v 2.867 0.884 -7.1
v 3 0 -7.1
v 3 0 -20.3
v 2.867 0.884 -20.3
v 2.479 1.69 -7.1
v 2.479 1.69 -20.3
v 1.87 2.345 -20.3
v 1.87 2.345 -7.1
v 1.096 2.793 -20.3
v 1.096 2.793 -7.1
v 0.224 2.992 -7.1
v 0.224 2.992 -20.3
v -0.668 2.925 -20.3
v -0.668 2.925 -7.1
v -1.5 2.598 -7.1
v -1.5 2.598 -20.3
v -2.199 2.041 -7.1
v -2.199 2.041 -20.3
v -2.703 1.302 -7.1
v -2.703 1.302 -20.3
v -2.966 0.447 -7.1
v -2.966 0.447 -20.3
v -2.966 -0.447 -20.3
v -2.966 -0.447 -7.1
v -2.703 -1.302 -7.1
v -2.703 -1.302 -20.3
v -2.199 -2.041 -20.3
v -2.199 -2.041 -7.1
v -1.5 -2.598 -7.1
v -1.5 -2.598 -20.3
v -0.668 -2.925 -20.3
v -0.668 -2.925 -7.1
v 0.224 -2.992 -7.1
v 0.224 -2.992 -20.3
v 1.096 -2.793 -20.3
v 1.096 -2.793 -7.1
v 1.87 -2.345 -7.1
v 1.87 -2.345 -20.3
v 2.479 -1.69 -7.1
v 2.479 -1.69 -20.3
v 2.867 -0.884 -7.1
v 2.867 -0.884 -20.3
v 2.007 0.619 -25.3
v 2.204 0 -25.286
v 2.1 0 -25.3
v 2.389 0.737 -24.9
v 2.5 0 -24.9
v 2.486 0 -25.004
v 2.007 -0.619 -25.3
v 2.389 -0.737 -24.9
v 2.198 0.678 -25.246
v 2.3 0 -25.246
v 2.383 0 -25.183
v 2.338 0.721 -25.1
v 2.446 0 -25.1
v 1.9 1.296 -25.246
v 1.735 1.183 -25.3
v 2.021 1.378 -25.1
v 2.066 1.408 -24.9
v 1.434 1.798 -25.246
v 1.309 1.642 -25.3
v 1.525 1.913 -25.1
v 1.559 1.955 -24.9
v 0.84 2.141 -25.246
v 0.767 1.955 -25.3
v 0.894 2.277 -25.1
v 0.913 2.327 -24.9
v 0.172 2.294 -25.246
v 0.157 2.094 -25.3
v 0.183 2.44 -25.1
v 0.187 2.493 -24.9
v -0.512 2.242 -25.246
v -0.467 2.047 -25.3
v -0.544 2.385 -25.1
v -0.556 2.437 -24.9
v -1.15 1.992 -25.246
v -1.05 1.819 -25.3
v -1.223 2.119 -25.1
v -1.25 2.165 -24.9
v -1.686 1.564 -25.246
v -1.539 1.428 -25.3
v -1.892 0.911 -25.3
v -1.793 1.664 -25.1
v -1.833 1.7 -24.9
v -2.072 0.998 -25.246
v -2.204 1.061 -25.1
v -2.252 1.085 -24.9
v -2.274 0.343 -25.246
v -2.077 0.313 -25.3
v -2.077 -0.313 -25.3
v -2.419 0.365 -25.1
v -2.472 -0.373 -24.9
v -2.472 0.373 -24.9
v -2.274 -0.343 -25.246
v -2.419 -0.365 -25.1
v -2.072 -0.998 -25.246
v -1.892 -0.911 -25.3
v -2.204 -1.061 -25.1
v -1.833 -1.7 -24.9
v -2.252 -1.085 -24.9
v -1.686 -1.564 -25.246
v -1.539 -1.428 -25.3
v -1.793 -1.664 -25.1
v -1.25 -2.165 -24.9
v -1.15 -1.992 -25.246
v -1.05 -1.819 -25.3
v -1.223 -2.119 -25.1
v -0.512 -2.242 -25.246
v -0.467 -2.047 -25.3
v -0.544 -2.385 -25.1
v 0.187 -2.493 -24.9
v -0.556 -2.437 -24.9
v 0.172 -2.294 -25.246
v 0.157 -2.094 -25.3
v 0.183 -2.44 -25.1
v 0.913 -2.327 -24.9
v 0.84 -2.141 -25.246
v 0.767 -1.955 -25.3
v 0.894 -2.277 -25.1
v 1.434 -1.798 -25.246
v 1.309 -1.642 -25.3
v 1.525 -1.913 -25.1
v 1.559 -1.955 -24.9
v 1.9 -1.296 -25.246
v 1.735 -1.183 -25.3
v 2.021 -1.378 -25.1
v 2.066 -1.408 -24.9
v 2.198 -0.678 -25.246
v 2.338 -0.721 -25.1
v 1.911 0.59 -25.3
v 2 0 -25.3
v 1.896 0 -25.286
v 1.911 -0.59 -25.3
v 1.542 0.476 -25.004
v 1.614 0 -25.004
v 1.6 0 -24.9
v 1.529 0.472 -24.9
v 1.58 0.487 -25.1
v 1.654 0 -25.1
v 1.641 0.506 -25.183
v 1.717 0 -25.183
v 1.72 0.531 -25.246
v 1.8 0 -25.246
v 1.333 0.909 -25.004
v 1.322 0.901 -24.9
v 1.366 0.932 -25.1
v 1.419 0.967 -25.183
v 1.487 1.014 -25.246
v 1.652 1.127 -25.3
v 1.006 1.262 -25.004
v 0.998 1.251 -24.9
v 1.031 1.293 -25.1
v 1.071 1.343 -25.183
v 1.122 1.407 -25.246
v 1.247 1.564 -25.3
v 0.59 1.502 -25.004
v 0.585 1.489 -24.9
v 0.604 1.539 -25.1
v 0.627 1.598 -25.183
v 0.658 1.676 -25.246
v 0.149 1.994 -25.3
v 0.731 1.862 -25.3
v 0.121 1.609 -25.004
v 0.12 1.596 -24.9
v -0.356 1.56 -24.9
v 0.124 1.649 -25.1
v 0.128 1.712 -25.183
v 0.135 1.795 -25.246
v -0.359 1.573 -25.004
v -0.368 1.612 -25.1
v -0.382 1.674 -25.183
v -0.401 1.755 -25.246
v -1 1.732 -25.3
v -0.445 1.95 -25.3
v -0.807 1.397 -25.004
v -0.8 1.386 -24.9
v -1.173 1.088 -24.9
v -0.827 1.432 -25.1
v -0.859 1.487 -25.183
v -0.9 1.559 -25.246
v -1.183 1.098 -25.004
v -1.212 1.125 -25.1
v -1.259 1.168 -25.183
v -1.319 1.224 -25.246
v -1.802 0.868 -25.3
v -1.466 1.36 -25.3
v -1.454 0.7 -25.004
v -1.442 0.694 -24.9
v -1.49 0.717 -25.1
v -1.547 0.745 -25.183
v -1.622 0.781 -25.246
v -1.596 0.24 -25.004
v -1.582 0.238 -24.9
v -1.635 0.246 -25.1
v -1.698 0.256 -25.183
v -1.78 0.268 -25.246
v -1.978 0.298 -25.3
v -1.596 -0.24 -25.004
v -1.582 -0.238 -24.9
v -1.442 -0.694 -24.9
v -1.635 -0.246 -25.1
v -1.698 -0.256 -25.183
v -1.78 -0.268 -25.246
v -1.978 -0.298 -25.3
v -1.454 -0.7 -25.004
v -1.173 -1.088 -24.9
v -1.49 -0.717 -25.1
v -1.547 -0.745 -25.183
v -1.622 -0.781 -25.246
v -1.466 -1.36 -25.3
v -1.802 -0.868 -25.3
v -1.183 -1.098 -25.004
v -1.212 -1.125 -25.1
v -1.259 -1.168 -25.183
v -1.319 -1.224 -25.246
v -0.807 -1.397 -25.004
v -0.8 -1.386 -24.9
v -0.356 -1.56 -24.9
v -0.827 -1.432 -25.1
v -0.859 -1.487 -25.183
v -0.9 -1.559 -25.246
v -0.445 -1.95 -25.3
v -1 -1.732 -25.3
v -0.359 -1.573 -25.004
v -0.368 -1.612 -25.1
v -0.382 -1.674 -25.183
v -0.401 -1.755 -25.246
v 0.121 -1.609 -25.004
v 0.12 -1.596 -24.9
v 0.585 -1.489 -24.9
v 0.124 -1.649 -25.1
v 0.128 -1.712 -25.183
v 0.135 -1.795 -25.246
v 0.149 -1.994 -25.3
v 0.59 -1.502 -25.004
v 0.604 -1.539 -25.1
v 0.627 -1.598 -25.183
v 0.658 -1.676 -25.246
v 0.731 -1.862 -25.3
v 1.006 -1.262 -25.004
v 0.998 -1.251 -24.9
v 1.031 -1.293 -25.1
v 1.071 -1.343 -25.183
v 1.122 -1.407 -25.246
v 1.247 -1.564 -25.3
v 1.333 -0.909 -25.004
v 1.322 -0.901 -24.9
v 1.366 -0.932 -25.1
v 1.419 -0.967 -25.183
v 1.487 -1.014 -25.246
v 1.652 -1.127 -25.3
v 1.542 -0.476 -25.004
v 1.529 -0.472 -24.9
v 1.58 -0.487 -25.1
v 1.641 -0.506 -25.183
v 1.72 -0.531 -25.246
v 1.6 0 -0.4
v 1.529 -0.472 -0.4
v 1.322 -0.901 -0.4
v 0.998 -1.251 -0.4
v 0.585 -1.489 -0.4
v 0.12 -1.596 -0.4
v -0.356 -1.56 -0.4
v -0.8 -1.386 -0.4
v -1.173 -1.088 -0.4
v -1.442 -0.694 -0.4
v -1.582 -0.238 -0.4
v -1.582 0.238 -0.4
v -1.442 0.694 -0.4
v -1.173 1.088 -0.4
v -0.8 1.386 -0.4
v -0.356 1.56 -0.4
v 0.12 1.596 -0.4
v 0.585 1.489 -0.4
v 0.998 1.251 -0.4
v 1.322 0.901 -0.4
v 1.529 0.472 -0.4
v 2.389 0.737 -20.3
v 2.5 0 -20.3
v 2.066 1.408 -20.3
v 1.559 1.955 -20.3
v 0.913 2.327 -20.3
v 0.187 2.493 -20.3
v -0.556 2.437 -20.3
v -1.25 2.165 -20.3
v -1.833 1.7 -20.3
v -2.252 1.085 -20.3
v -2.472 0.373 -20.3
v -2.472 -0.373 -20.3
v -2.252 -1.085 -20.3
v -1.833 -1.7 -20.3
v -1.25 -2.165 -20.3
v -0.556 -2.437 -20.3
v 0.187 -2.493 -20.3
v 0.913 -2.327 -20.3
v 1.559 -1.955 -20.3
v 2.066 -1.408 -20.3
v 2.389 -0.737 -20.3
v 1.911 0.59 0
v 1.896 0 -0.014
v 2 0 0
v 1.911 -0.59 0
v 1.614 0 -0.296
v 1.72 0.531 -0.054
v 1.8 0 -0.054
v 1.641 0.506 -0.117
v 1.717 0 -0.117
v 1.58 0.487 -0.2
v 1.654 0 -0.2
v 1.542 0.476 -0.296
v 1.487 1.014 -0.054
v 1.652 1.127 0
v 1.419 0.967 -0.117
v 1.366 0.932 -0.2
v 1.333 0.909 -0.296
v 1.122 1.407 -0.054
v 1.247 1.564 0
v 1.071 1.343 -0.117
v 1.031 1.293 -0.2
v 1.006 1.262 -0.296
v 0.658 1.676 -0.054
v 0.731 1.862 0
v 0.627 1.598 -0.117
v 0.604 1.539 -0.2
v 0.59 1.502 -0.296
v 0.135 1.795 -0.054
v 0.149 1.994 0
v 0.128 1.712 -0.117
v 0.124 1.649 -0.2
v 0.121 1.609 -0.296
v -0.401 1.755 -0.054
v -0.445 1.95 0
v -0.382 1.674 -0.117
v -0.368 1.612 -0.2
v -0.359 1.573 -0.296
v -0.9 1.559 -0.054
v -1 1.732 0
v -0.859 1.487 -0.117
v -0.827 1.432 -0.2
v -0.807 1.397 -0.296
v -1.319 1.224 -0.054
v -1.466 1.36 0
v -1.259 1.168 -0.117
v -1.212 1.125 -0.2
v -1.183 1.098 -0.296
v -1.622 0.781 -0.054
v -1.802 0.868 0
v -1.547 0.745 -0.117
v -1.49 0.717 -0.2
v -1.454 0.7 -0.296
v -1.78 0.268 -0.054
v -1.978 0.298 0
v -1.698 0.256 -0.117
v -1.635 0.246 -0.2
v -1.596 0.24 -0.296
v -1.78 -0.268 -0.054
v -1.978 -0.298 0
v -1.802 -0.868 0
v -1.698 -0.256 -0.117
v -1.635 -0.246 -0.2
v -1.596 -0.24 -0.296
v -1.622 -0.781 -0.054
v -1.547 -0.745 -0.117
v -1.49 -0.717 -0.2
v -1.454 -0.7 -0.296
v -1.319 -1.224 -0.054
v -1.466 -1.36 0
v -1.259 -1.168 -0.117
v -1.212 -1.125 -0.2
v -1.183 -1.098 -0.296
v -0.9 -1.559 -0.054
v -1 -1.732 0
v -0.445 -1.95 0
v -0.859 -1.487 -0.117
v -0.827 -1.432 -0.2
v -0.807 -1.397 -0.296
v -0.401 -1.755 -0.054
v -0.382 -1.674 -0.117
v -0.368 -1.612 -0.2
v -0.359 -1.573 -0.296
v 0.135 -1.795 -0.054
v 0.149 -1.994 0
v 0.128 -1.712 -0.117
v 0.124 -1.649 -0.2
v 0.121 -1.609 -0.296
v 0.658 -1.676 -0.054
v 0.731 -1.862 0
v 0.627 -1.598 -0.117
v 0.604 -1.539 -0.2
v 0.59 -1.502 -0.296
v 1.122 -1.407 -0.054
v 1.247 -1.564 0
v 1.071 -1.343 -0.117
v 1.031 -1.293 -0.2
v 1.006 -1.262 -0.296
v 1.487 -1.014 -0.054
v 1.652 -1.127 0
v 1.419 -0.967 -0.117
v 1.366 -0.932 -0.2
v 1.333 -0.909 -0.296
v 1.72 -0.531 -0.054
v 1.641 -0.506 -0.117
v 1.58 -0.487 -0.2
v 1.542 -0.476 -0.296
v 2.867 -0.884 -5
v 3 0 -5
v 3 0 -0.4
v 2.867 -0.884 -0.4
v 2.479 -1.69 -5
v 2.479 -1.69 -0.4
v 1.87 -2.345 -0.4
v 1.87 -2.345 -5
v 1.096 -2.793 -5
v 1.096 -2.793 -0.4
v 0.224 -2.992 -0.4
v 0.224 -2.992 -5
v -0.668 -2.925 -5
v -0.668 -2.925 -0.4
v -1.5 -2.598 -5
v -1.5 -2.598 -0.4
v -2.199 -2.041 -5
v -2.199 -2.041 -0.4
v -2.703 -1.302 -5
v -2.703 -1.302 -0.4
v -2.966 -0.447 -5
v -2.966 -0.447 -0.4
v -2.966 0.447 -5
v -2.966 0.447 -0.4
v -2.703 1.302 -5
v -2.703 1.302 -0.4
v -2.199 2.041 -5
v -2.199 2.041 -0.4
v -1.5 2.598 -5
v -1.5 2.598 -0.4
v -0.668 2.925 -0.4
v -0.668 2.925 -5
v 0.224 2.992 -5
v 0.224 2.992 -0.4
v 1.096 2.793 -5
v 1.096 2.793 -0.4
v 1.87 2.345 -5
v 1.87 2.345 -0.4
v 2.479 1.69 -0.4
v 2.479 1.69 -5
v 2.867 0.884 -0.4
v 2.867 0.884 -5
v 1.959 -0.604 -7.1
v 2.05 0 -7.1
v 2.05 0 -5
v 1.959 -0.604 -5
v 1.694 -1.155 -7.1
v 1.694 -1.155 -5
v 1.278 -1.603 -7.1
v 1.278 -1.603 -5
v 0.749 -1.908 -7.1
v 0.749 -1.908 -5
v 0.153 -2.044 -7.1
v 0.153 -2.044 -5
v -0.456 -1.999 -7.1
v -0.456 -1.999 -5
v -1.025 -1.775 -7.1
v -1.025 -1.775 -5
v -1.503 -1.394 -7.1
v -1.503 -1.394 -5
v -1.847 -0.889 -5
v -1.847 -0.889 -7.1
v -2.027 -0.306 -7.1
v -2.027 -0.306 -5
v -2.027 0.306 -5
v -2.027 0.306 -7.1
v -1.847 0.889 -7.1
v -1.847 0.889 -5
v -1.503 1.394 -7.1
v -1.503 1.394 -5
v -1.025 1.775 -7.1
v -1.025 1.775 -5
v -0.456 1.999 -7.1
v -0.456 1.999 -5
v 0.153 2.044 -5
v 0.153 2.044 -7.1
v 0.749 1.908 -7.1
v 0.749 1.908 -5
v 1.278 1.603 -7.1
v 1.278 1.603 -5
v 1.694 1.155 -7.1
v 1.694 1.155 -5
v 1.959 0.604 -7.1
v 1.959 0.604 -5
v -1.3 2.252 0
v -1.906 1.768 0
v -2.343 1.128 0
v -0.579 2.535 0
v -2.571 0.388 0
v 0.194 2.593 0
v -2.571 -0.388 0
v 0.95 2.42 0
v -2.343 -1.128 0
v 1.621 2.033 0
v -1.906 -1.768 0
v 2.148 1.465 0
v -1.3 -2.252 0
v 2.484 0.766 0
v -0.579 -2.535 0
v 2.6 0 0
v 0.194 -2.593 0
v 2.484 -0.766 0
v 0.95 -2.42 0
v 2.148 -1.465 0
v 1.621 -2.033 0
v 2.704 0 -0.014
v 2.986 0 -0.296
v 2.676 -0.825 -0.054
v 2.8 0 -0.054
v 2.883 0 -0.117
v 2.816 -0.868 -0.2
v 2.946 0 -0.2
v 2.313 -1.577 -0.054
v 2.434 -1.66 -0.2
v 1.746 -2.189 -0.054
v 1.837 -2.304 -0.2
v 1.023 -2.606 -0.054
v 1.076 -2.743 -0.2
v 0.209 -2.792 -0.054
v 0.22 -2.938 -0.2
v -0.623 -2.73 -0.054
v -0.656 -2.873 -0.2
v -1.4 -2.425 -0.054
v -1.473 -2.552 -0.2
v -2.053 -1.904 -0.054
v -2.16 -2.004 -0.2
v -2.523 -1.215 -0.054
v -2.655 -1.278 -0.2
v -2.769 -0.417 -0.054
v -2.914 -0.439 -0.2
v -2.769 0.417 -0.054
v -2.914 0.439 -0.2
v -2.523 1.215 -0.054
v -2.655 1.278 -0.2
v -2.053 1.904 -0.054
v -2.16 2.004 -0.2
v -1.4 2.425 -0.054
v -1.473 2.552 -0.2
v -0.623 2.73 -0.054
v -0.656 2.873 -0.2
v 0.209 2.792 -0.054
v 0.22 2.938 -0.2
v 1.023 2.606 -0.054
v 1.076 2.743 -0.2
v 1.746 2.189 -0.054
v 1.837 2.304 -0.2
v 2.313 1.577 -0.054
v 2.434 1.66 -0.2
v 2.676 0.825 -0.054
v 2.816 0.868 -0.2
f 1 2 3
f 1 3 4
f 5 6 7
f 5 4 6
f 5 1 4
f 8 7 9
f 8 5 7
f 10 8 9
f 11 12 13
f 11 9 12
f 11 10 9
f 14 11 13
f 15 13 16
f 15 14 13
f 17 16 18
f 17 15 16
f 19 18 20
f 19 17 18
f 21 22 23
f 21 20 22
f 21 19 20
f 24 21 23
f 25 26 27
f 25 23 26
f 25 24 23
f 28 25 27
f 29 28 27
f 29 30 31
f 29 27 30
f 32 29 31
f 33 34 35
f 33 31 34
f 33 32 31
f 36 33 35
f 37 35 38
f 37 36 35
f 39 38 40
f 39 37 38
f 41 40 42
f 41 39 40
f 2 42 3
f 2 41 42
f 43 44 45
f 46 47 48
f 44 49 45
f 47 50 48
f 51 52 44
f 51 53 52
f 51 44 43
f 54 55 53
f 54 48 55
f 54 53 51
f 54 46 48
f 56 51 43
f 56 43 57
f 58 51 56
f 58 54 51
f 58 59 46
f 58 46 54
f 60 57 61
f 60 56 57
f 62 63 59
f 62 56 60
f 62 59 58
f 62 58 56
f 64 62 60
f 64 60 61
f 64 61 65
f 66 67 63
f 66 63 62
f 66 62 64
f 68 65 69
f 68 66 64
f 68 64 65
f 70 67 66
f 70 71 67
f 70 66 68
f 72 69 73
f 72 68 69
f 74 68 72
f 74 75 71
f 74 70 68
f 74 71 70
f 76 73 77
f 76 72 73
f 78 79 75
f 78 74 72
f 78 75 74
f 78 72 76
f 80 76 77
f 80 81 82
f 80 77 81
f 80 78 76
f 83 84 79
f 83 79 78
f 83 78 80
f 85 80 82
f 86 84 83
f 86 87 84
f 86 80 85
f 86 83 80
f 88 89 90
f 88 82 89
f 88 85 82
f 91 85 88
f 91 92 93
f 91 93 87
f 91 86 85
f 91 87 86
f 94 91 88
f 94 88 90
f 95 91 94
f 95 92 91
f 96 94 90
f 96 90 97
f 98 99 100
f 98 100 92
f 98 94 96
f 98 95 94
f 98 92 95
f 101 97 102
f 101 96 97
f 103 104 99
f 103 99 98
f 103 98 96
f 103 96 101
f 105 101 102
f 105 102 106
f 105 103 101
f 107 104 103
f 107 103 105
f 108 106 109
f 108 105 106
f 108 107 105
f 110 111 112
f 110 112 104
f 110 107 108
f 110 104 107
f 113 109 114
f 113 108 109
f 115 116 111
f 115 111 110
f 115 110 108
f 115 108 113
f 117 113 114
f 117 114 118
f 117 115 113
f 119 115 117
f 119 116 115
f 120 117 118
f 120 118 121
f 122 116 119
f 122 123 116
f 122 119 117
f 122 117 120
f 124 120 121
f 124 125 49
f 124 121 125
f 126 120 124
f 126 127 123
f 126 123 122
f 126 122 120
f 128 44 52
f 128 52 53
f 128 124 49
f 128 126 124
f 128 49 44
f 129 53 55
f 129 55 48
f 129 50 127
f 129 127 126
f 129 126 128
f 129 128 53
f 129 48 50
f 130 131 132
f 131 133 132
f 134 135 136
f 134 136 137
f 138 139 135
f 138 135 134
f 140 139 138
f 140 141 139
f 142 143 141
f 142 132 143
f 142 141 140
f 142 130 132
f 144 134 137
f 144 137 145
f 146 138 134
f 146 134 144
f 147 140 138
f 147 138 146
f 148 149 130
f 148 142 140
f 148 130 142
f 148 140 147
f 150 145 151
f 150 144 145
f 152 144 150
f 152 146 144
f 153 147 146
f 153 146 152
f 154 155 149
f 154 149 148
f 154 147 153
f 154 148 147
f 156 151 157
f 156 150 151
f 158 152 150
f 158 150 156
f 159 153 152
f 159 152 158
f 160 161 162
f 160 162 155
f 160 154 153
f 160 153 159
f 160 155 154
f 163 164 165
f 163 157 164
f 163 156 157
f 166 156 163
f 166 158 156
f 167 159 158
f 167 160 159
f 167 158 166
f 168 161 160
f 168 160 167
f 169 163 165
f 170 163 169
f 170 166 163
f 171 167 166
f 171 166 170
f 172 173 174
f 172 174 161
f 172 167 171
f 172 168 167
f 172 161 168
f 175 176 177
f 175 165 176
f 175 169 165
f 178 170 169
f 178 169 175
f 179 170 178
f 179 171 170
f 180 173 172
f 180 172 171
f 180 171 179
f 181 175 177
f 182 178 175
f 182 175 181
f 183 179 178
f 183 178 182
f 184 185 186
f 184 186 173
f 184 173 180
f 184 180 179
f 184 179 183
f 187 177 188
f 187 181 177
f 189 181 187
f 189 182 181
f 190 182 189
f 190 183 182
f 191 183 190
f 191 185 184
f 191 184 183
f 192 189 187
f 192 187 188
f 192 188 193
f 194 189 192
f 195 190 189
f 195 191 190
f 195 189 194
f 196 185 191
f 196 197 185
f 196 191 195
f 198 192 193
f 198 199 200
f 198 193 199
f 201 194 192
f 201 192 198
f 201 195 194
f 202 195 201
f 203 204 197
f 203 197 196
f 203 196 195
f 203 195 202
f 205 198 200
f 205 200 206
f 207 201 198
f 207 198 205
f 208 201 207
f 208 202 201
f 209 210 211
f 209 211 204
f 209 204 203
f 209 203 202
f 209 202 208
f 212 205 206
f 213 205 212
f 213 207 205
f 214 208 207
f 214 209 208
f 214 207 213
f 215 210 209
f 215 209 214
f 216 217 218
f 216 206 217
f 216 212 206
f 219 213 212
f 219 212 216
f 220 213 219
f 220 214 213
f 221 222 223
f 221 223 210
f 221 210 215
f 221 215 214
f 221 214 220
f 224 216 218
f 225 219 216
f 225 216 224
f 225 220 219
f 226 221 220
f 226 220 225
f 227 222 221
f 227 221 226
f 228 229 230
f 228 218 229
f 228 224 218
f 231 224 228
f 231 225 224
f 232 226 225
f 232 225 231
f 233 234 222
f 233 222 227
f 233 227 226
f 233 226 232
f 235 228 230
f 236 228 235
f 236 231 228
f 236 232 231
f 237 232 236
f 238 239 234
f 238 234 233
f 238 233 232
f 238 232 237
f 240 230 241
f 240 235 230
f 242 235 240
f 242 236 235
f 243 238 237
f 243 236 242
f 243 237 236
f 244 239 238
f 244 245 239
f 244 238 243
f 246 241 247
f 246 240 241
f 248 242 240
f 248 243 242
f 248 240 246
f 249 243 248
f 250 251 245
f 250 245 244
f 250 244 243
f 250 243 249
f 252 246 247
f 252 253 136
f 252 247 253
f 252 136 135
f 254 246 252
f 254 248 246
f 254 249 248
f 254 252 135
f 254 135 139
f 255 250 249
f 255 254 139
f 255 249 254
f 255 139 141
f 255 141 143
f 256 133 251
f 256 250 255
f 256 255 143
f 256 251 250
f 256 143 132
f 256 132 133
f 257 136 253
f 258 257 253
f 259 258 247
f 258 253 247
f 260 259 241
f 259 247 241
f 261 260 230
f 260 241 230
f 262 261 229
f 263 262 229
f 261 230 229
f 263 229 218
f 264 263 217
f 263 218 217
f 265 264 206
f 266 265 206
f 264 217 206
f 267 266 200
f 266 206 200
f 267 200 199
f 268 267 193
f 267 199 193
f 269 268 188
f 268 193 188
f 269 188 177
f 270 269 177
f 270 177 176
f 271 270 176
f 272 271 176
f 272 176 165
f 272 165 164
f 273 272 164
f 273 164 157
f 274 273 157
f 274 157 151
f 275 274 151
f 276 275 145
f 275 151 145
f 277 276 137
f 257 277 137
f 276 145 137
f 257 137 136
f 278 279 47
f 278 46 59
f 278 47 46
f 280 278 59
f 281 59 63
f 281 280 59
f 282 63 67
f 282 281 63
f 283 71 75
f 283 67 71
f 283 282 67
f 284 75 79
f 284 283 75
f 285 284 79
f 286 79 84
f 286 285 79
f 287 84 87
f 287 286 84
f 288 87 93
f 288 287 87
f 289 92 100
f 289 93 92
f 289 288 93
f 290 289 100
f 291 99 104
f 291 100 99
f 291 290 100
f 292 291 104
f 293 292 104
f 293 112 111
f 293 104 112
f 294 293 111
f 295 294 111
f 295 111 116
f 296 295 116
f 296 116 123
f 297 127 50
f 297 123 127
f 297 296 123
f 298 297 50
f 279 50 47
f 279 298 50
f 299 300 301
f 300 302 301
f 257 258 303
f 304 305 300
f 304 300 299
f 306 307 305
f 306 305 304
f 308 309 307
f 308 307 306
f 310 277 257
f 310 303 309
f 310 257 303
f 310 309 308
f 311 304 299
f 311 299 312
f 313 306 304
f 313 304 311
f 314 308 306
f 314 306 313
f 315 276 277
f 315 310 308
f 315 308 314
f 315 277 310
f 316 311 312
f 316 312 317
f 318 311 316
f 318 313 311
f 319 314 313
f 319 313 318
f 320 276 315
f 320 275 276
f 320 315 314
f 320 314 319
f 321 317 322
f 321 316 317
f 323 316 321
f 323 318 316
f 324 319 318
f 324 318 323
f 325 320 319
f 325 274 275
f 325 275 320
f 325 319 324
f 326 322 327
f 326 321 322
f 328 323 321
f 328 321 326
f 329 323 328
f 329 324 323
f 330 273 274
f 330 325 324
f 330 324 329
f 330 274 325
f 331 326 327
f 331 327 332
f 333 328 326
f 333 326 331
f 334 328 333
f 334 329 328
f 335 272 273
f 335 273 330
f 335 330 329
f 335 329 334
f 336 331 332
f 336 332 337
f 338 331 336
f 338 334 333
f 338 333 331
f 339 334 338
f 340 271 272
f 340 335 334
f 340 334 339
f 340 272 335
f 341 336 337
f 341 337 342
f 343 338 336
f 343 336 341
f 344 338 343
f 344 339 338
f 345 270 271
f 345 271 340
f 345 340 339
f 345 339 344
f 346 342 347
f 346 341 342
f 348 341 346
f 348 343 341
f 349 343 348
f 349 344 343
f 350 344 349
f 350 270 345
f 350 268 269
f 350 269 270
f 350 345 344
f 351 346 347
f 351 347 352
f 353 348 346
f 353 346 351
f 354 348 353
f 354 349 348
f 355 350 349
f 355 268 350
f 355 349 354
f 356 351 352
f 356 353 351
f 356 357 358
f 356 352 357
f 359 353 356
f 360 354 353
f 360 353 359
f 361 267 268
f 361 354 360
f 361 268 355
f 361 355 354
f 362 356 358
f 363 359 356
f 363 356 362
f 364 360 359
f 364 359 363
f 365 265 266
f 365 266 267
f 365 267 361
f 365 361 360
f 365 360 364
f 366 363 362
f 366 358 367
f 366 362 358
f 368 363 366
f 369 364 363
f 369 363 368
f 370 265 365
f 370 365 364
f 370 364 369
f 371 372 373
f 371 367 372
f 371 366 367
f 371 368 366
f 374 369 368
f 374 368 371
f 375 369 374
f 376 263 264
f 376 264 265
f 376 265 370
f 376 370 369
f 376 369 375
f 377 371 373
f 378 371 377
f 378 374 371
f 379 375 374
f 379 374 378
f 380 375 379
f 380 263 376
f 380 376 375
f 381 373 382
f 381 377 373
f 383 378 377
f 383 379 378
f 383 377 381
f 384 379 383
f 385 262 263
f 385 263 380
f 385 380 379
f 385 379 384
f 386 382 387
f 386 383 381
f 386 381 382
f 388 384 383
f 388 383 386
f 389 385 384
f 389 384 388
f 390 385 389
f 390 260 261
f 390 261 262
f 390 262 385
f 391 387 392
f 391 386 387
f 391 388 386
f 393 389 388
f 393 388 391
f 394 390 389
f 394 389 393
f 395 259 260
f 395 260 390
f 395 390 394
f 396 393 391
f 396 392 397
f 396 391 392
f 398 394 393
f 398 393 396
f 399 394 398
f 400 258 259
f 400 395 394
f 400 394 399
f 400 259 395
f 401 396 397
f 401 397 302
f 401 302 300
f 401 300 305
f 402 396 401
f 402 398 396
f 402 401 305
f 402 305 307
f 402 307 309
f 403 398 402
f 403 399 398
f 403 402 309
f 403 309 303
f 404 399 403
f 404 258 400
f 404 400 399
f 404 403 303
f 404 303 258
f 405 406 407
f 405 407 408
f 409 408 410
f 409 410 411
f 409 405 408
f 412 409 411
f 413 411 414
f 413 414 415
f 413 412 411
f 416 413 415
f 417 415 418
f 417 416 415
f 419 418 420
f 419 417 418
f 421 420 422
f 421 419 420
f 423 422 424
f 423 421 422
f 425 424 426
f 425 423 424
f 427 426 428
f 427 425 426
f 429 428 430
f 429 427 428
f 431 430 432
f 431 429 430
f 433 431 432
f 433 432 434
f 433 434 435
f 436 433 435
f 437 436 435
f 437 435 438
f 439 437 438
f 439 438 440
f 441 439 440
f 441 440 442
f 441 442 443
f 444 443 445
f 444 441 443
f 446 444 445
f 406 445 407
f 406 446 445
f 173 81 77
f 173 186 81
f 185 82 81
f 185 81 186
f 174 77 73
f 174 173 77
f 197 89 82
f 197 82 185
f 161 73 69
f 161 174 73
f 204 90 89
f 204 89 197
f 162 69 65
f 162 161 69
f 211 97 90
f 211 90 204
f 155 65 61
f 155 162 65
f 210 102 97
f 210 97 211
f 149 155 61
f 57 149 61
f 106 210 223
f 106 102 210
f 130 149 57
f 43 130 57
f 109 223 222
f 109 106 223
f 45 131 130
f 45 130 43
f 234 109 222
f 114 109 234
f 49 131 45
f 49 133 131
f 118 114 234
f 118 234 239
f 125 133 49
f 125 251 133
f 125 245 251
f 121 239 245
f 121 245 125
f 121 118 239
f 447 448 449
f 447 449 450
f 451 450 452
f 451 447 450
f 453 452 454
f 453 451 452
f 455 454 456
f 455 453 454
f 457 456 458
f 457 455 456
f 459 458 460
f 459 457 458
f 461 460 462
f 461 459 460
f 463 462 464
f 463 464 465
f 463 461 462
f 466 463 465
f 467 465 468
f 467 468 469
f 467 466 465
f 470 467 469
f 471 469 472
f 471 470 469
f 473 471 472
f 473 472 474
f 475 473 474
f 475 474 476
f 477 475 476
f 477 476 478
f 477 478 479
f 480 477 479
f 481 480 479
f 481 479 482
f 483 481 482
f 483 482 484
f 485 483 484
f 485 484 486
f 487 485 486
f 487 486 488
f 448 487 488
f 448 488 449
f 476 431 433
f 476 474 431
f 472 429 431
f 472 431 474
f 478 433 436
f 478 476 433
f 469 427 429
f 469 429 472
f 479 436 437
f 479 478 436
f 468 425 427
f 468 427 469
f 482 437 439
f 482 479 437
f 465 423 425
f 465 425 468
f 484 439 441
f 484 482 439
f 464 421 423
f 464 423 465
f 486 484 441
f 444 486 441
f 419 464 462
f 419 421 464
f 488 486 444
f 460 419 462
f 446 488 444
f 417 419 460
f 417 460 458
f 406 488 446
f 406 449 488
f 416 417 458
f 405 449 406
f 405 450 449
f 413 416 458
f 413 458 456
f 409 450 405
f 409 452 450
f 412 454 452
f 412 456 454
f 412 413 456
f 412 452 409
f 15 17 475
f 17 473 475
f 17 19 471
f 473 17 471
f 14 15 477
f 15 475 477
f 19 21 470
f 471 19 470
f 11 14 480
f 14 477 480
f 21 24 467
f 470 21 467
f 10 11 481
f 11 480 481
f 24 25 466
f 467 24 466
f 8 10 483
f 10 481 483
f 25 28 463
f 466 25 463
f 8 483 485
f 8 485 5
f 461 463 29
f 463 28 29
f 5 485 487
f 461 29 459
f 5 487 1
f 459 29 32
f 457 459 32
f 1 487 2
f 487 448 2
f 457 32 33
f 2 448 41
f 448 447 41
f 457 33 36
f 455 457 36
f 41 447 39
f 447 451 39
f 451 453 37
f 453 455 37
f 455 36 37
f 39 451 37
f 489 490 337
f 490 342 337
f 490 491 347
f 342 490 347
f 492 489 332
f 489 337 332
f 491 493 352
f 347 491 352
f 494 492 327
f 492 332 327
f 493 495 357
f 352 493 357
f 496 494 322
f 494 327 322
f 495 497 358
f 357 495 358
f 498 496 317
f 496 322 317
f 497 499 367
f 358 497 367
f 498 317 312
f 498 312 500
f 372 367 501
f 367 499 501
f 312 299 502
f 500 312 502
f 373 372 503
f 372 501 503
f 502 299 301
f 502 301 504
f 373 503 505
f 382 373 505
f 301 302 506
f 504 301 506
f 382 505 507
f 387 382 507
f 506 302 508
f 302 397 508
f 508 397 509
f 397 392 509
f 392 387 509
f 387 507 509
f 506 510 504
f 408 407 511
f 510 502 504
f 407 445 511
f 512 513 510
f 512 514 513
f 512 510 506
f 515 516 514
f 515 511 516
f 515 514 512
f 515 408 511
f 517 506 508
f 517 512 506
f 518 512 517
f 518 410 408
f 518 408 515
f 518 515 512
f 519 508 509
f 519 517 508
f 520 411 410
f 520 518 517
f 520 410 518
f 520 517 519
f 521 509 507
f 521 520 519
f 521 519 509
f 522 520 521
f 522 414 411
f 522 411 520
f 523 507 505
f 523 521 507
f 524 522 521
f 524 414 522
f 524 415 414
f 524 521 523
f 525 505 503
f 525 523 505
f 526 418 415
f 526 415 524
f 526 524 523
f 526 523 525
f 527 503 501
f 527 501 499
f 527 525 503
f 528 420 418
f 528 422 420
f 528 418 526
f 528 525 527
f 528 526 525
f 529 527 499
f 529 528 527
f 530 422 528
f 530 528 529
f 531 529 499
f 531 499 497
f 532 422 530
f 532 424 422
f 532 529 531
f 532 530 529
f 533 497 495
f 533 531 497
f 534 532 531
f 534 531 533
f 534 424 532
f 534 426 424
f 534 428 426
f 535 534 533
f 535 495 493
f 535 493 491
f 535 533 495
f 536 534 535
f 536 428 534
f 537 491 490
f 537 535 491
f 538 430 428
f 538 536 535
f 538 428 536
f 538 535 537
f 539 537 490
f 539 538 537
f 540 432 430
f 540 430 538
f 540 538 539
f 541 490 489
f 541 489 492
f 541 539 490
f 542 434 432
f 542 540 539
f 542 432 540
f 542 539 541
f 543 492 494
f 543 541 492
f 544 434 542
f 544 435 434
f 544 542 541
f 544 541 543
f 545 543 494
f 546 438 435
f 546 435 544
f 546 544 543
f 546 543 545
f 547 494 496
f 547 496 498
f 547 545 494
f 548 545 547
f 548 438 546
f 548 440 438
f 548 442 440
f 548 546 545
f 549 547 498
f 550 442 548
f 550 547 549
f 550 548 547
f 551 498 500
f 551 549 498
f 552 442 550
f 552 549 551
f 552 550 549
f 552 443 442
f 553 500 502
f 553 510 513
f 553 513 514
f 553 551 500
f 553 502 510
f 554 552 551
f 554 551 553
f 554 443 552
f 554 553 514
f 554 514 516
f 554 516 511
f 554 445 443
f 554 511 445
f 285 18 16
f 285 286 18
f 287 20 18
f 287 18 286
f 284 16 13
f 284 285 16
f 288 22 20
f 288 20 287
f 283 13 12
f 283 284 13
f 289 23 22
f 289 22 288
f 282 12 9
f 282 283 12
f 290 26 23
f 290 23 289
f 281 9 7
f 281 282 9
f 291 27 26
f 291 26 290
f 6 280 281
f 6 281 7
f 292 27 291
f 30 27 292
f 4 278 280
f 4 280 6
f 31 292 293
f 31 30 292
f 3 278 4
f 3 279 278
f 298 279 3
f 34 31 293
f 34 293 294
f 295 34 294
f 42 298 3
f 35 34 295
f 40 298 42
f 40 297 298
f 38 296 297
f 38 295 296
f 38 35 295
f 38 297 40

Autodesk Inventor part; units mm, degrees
ref_plane "YZ Plane" through (0, 0, 0) normal (1, 0, 0) x (0, 1, 0)
ref_plane "XZ Plane" through (0, 0, 0) normal (0, 1, 0) x (-1, 0, 0)
ref_plane "XY Plane" through (0, 0, 0) normal (0, 0, 1) x (1, 0, 0)
sketch "Эскиз1" plane through (0, 0, 0) normal (0, 1, 0) x (-1, 0, 0)
  line L0 (0, 0) -> (0, -25.3) construction
  line L1 (0, 0) -> (-3, 0) construction
  line L2 (-3, 0) -> (-3, -5)
  line L3 (0, -5) -> (-2.05, -5) construction
  line L4 (-2.05, -5) -> (-2.05, -7.1)
  line L5 (-3, -5) -> (-2.05, -5)
  line L6 (-2.05, -7.1) -> (-3, -7.1)
  line L7 (0, 0) -> (-1.6, 0) construction
  line L8 (-1.6, 0) -> (-3, 0) construction
  line L9 (-1.6, 0) -> (-3, 0)
  line L10 (-1.6, 0) -> (-1.6, -25.3)
  line L11 (0, -25.3) -> (-2.5, -25.3) construction
  line L12 (-1.6, -25.3) -> (-2.5, -25.3)
  line L13 (-2.5, -25.3) -> (-2.5, -20.3)
  line L14 (-2.5, -20.3) -> (-3, -20.3)
  line L15 (-3, -20.3) -> (-3, -7.1)
  dimension "d4" = 25.3
  dimension "d5" = 3
  dimension "d6" = 5
  dimension "d7" = 2.05
  dimension "d8" = 2.1
  dimension "d9" = 1.6
  dimension "d10" = 25.3
  dimension "d11" = 2.5
  dimension "d12" = 5
revolve "Вращение1" add sketch "Эскиз1" angle 360 about axis through (0, 0, 0) along (0, 0, -1)
fillet "Сопряжение1" radius 0.4 4 edges at (-2.5, 0, -25.3) (-3, 0, 0) (-1.6, 0, 0) (-1.6, 0, -25.3)
thread "Резьба1" size "M6x1" class "6g" standard "ANSI Metric M Profile" full length
thread "Резьба2" size "M6x1" class "6g" standard "ANSI Metric M Profile" full length
properties part number "BREAK"
